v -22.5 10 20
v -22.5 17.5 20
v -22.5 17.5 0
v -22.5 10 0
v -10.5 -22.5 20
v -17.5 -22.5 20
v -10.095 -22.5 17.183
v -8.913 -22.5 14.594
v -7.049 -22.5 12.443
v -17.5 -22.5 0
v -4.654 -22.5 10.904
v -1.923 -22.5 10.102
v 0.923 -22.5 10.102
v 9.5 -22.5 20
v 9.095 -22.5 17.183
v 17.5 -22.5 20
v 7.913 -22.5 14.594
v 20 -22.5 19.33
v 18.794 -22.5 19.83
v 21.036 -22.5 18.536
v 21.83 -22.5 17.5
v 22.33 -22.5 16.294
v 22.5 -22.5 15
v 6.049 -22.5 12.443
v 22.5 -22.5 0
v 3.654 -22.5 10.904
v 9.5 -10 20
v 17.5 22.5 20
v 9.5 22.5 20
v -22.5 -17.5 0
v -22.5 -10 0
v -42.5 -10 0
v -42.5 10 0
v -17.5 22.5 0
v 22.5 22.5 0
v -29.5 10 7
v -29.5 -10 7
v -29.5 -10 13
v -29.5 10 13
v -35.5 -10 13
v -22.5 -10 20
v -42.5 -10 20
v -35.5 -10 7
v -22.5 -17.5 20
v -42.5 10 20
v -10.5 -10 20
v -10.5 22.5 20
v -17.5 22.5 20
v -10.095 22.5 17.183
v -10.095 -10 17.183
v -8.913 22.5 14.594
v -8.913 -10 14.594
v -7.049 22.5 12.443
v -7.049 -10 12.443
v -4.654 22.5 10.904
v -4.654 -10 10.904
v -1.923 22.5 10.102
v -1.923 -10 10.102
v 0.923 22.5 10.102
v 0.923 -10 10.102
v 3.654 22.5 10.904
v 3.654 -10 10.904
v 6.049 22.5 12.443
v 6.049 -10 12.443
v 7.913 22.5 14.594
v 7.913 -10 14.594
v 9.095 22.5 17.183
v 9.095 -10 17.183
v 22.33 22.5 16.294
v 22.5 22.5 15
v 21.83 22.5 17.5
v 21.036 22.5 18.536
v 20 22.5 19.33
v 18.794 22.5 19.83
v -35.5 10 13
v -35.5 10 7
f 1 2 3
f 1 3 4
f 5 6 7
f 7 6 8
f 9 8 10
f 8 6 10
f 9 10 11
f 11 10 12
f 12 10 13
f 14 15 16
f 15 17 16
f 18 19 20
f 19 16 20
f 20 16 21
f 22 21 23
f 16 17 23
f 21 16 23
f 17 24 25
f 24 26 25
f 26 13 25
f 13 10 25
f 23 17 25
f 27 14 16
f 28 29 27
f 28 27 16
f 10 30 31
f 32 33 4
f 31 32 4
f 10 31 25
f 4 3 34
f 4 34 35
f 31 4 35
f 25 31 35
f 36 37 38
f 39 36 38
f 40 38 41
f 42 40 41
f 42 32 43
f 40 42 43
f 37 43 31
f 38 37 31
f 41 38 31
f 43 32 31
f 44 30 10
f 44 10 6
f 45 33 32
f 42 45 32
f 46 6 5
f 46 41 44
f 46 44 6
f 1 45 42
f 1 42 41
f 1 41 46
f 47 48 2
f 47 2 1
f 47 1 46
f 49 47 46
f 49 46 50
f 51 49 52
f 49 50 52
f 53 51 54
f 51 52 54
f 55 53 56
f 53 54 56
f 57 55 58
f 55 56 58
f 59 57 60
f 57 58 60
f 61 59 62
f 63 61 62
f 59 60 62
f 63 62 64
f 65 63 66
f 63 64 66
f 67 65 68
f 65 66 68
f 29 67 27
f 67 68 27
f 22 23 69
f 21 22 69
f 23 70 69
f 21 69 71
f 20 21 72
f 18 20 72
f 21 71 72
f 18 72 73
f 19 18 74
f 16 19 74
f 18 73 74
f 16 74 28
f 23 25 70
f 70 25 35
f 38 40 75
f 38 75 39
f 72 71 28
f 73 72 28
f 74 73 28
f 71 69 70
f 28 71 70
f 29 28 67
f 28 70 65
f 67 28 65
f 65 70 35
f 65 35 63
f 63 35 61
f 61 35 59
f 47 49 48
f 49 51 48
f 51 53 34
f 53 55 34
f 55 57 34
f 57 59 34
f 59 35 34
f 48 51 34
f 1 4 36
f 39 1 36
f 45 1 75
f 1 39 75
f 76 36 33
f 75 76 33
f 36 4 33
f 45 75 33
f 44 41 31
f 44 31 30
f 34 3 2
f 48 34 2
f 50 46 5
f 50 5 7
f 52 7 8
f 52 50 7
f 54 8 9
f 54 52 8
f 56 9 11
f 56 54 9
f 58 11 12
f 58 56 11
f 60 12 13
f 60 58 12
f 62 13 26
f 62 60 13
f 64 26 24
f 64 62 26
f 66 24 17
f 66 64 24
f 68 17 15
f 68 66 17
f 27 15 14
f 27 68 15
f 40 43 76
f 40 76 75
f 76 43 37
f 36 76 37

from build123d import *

# Parameters (mm, degrees)
F1_DEPTH = 20
F2_SIZE  = 5
F3_R     = 5
F4_R     = 10
F4_W     = 6
F4_H     = 6
F5_DEPTH = 54.4


with BuildPart() as f1:
    # F0 (on Top) → F1 (new body)
    with BuildSketch(Plane.XY):
        Polygon((-22.5, -22.5), (22.5, -22.5), (22.5, 22.5), (-22.5, 22.5), (-22.5, 10), (-42.5, 10), (-42.5, -10), (-22.5, -10), align=None)
    extrude(amount=F1_DEPTH)

    # F2
    f2_edges = [f1.edges().sort_by_distance(p)[0] for p in [
        (-22.5, -22.5, 10),
        (-22.5, 22.5, 10),
    ]]
    chamfer(f2_edges, length=F2_SIZE)

    # F3
    f3_edges = [f1.edges().sort_by_distance(p)[0] for p in [
        (22.5, 0, 20),
    ]]
    fillet(f3_edges, radius=F3_R)

    # F4 (on face) → F5 (cut, symmetric)
    with BuildSketch(Plane.XZ.offset(10)):
        with Locations((-0.5, 20)):
            Circle(F4_R)
        with Locations((-32.5, 10)):
            Rectangle(F4_W, F4_H)
    extrude(amount=F5_DEPTH, both=True, mode=Mode.SUBTRACT)


solid = f1.part
